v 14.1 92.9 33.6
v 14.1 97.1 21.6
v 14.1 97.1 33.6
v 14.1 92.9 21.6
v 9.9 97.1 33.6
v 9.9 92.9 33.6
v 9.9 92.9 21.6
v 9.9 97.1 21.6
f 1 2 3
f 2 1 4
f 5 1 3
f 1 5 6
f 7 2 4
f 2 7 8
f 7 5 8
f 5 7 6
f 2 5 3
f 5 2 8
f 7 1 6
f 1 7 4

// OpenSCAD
// Generated by spec/prepare_parent_retrofit_printing.py from validated release fasteners. NOT A PRINTABLE PART.
union(){
translate([9.9, 92.9, 21.599999237060548]) cube([4.2, 4.2, 12.00000228881836]);
translate([9.9, 92.9, 21.599999237060548]) cube([4.2, 4.2, 12.00000228881836]);
}
